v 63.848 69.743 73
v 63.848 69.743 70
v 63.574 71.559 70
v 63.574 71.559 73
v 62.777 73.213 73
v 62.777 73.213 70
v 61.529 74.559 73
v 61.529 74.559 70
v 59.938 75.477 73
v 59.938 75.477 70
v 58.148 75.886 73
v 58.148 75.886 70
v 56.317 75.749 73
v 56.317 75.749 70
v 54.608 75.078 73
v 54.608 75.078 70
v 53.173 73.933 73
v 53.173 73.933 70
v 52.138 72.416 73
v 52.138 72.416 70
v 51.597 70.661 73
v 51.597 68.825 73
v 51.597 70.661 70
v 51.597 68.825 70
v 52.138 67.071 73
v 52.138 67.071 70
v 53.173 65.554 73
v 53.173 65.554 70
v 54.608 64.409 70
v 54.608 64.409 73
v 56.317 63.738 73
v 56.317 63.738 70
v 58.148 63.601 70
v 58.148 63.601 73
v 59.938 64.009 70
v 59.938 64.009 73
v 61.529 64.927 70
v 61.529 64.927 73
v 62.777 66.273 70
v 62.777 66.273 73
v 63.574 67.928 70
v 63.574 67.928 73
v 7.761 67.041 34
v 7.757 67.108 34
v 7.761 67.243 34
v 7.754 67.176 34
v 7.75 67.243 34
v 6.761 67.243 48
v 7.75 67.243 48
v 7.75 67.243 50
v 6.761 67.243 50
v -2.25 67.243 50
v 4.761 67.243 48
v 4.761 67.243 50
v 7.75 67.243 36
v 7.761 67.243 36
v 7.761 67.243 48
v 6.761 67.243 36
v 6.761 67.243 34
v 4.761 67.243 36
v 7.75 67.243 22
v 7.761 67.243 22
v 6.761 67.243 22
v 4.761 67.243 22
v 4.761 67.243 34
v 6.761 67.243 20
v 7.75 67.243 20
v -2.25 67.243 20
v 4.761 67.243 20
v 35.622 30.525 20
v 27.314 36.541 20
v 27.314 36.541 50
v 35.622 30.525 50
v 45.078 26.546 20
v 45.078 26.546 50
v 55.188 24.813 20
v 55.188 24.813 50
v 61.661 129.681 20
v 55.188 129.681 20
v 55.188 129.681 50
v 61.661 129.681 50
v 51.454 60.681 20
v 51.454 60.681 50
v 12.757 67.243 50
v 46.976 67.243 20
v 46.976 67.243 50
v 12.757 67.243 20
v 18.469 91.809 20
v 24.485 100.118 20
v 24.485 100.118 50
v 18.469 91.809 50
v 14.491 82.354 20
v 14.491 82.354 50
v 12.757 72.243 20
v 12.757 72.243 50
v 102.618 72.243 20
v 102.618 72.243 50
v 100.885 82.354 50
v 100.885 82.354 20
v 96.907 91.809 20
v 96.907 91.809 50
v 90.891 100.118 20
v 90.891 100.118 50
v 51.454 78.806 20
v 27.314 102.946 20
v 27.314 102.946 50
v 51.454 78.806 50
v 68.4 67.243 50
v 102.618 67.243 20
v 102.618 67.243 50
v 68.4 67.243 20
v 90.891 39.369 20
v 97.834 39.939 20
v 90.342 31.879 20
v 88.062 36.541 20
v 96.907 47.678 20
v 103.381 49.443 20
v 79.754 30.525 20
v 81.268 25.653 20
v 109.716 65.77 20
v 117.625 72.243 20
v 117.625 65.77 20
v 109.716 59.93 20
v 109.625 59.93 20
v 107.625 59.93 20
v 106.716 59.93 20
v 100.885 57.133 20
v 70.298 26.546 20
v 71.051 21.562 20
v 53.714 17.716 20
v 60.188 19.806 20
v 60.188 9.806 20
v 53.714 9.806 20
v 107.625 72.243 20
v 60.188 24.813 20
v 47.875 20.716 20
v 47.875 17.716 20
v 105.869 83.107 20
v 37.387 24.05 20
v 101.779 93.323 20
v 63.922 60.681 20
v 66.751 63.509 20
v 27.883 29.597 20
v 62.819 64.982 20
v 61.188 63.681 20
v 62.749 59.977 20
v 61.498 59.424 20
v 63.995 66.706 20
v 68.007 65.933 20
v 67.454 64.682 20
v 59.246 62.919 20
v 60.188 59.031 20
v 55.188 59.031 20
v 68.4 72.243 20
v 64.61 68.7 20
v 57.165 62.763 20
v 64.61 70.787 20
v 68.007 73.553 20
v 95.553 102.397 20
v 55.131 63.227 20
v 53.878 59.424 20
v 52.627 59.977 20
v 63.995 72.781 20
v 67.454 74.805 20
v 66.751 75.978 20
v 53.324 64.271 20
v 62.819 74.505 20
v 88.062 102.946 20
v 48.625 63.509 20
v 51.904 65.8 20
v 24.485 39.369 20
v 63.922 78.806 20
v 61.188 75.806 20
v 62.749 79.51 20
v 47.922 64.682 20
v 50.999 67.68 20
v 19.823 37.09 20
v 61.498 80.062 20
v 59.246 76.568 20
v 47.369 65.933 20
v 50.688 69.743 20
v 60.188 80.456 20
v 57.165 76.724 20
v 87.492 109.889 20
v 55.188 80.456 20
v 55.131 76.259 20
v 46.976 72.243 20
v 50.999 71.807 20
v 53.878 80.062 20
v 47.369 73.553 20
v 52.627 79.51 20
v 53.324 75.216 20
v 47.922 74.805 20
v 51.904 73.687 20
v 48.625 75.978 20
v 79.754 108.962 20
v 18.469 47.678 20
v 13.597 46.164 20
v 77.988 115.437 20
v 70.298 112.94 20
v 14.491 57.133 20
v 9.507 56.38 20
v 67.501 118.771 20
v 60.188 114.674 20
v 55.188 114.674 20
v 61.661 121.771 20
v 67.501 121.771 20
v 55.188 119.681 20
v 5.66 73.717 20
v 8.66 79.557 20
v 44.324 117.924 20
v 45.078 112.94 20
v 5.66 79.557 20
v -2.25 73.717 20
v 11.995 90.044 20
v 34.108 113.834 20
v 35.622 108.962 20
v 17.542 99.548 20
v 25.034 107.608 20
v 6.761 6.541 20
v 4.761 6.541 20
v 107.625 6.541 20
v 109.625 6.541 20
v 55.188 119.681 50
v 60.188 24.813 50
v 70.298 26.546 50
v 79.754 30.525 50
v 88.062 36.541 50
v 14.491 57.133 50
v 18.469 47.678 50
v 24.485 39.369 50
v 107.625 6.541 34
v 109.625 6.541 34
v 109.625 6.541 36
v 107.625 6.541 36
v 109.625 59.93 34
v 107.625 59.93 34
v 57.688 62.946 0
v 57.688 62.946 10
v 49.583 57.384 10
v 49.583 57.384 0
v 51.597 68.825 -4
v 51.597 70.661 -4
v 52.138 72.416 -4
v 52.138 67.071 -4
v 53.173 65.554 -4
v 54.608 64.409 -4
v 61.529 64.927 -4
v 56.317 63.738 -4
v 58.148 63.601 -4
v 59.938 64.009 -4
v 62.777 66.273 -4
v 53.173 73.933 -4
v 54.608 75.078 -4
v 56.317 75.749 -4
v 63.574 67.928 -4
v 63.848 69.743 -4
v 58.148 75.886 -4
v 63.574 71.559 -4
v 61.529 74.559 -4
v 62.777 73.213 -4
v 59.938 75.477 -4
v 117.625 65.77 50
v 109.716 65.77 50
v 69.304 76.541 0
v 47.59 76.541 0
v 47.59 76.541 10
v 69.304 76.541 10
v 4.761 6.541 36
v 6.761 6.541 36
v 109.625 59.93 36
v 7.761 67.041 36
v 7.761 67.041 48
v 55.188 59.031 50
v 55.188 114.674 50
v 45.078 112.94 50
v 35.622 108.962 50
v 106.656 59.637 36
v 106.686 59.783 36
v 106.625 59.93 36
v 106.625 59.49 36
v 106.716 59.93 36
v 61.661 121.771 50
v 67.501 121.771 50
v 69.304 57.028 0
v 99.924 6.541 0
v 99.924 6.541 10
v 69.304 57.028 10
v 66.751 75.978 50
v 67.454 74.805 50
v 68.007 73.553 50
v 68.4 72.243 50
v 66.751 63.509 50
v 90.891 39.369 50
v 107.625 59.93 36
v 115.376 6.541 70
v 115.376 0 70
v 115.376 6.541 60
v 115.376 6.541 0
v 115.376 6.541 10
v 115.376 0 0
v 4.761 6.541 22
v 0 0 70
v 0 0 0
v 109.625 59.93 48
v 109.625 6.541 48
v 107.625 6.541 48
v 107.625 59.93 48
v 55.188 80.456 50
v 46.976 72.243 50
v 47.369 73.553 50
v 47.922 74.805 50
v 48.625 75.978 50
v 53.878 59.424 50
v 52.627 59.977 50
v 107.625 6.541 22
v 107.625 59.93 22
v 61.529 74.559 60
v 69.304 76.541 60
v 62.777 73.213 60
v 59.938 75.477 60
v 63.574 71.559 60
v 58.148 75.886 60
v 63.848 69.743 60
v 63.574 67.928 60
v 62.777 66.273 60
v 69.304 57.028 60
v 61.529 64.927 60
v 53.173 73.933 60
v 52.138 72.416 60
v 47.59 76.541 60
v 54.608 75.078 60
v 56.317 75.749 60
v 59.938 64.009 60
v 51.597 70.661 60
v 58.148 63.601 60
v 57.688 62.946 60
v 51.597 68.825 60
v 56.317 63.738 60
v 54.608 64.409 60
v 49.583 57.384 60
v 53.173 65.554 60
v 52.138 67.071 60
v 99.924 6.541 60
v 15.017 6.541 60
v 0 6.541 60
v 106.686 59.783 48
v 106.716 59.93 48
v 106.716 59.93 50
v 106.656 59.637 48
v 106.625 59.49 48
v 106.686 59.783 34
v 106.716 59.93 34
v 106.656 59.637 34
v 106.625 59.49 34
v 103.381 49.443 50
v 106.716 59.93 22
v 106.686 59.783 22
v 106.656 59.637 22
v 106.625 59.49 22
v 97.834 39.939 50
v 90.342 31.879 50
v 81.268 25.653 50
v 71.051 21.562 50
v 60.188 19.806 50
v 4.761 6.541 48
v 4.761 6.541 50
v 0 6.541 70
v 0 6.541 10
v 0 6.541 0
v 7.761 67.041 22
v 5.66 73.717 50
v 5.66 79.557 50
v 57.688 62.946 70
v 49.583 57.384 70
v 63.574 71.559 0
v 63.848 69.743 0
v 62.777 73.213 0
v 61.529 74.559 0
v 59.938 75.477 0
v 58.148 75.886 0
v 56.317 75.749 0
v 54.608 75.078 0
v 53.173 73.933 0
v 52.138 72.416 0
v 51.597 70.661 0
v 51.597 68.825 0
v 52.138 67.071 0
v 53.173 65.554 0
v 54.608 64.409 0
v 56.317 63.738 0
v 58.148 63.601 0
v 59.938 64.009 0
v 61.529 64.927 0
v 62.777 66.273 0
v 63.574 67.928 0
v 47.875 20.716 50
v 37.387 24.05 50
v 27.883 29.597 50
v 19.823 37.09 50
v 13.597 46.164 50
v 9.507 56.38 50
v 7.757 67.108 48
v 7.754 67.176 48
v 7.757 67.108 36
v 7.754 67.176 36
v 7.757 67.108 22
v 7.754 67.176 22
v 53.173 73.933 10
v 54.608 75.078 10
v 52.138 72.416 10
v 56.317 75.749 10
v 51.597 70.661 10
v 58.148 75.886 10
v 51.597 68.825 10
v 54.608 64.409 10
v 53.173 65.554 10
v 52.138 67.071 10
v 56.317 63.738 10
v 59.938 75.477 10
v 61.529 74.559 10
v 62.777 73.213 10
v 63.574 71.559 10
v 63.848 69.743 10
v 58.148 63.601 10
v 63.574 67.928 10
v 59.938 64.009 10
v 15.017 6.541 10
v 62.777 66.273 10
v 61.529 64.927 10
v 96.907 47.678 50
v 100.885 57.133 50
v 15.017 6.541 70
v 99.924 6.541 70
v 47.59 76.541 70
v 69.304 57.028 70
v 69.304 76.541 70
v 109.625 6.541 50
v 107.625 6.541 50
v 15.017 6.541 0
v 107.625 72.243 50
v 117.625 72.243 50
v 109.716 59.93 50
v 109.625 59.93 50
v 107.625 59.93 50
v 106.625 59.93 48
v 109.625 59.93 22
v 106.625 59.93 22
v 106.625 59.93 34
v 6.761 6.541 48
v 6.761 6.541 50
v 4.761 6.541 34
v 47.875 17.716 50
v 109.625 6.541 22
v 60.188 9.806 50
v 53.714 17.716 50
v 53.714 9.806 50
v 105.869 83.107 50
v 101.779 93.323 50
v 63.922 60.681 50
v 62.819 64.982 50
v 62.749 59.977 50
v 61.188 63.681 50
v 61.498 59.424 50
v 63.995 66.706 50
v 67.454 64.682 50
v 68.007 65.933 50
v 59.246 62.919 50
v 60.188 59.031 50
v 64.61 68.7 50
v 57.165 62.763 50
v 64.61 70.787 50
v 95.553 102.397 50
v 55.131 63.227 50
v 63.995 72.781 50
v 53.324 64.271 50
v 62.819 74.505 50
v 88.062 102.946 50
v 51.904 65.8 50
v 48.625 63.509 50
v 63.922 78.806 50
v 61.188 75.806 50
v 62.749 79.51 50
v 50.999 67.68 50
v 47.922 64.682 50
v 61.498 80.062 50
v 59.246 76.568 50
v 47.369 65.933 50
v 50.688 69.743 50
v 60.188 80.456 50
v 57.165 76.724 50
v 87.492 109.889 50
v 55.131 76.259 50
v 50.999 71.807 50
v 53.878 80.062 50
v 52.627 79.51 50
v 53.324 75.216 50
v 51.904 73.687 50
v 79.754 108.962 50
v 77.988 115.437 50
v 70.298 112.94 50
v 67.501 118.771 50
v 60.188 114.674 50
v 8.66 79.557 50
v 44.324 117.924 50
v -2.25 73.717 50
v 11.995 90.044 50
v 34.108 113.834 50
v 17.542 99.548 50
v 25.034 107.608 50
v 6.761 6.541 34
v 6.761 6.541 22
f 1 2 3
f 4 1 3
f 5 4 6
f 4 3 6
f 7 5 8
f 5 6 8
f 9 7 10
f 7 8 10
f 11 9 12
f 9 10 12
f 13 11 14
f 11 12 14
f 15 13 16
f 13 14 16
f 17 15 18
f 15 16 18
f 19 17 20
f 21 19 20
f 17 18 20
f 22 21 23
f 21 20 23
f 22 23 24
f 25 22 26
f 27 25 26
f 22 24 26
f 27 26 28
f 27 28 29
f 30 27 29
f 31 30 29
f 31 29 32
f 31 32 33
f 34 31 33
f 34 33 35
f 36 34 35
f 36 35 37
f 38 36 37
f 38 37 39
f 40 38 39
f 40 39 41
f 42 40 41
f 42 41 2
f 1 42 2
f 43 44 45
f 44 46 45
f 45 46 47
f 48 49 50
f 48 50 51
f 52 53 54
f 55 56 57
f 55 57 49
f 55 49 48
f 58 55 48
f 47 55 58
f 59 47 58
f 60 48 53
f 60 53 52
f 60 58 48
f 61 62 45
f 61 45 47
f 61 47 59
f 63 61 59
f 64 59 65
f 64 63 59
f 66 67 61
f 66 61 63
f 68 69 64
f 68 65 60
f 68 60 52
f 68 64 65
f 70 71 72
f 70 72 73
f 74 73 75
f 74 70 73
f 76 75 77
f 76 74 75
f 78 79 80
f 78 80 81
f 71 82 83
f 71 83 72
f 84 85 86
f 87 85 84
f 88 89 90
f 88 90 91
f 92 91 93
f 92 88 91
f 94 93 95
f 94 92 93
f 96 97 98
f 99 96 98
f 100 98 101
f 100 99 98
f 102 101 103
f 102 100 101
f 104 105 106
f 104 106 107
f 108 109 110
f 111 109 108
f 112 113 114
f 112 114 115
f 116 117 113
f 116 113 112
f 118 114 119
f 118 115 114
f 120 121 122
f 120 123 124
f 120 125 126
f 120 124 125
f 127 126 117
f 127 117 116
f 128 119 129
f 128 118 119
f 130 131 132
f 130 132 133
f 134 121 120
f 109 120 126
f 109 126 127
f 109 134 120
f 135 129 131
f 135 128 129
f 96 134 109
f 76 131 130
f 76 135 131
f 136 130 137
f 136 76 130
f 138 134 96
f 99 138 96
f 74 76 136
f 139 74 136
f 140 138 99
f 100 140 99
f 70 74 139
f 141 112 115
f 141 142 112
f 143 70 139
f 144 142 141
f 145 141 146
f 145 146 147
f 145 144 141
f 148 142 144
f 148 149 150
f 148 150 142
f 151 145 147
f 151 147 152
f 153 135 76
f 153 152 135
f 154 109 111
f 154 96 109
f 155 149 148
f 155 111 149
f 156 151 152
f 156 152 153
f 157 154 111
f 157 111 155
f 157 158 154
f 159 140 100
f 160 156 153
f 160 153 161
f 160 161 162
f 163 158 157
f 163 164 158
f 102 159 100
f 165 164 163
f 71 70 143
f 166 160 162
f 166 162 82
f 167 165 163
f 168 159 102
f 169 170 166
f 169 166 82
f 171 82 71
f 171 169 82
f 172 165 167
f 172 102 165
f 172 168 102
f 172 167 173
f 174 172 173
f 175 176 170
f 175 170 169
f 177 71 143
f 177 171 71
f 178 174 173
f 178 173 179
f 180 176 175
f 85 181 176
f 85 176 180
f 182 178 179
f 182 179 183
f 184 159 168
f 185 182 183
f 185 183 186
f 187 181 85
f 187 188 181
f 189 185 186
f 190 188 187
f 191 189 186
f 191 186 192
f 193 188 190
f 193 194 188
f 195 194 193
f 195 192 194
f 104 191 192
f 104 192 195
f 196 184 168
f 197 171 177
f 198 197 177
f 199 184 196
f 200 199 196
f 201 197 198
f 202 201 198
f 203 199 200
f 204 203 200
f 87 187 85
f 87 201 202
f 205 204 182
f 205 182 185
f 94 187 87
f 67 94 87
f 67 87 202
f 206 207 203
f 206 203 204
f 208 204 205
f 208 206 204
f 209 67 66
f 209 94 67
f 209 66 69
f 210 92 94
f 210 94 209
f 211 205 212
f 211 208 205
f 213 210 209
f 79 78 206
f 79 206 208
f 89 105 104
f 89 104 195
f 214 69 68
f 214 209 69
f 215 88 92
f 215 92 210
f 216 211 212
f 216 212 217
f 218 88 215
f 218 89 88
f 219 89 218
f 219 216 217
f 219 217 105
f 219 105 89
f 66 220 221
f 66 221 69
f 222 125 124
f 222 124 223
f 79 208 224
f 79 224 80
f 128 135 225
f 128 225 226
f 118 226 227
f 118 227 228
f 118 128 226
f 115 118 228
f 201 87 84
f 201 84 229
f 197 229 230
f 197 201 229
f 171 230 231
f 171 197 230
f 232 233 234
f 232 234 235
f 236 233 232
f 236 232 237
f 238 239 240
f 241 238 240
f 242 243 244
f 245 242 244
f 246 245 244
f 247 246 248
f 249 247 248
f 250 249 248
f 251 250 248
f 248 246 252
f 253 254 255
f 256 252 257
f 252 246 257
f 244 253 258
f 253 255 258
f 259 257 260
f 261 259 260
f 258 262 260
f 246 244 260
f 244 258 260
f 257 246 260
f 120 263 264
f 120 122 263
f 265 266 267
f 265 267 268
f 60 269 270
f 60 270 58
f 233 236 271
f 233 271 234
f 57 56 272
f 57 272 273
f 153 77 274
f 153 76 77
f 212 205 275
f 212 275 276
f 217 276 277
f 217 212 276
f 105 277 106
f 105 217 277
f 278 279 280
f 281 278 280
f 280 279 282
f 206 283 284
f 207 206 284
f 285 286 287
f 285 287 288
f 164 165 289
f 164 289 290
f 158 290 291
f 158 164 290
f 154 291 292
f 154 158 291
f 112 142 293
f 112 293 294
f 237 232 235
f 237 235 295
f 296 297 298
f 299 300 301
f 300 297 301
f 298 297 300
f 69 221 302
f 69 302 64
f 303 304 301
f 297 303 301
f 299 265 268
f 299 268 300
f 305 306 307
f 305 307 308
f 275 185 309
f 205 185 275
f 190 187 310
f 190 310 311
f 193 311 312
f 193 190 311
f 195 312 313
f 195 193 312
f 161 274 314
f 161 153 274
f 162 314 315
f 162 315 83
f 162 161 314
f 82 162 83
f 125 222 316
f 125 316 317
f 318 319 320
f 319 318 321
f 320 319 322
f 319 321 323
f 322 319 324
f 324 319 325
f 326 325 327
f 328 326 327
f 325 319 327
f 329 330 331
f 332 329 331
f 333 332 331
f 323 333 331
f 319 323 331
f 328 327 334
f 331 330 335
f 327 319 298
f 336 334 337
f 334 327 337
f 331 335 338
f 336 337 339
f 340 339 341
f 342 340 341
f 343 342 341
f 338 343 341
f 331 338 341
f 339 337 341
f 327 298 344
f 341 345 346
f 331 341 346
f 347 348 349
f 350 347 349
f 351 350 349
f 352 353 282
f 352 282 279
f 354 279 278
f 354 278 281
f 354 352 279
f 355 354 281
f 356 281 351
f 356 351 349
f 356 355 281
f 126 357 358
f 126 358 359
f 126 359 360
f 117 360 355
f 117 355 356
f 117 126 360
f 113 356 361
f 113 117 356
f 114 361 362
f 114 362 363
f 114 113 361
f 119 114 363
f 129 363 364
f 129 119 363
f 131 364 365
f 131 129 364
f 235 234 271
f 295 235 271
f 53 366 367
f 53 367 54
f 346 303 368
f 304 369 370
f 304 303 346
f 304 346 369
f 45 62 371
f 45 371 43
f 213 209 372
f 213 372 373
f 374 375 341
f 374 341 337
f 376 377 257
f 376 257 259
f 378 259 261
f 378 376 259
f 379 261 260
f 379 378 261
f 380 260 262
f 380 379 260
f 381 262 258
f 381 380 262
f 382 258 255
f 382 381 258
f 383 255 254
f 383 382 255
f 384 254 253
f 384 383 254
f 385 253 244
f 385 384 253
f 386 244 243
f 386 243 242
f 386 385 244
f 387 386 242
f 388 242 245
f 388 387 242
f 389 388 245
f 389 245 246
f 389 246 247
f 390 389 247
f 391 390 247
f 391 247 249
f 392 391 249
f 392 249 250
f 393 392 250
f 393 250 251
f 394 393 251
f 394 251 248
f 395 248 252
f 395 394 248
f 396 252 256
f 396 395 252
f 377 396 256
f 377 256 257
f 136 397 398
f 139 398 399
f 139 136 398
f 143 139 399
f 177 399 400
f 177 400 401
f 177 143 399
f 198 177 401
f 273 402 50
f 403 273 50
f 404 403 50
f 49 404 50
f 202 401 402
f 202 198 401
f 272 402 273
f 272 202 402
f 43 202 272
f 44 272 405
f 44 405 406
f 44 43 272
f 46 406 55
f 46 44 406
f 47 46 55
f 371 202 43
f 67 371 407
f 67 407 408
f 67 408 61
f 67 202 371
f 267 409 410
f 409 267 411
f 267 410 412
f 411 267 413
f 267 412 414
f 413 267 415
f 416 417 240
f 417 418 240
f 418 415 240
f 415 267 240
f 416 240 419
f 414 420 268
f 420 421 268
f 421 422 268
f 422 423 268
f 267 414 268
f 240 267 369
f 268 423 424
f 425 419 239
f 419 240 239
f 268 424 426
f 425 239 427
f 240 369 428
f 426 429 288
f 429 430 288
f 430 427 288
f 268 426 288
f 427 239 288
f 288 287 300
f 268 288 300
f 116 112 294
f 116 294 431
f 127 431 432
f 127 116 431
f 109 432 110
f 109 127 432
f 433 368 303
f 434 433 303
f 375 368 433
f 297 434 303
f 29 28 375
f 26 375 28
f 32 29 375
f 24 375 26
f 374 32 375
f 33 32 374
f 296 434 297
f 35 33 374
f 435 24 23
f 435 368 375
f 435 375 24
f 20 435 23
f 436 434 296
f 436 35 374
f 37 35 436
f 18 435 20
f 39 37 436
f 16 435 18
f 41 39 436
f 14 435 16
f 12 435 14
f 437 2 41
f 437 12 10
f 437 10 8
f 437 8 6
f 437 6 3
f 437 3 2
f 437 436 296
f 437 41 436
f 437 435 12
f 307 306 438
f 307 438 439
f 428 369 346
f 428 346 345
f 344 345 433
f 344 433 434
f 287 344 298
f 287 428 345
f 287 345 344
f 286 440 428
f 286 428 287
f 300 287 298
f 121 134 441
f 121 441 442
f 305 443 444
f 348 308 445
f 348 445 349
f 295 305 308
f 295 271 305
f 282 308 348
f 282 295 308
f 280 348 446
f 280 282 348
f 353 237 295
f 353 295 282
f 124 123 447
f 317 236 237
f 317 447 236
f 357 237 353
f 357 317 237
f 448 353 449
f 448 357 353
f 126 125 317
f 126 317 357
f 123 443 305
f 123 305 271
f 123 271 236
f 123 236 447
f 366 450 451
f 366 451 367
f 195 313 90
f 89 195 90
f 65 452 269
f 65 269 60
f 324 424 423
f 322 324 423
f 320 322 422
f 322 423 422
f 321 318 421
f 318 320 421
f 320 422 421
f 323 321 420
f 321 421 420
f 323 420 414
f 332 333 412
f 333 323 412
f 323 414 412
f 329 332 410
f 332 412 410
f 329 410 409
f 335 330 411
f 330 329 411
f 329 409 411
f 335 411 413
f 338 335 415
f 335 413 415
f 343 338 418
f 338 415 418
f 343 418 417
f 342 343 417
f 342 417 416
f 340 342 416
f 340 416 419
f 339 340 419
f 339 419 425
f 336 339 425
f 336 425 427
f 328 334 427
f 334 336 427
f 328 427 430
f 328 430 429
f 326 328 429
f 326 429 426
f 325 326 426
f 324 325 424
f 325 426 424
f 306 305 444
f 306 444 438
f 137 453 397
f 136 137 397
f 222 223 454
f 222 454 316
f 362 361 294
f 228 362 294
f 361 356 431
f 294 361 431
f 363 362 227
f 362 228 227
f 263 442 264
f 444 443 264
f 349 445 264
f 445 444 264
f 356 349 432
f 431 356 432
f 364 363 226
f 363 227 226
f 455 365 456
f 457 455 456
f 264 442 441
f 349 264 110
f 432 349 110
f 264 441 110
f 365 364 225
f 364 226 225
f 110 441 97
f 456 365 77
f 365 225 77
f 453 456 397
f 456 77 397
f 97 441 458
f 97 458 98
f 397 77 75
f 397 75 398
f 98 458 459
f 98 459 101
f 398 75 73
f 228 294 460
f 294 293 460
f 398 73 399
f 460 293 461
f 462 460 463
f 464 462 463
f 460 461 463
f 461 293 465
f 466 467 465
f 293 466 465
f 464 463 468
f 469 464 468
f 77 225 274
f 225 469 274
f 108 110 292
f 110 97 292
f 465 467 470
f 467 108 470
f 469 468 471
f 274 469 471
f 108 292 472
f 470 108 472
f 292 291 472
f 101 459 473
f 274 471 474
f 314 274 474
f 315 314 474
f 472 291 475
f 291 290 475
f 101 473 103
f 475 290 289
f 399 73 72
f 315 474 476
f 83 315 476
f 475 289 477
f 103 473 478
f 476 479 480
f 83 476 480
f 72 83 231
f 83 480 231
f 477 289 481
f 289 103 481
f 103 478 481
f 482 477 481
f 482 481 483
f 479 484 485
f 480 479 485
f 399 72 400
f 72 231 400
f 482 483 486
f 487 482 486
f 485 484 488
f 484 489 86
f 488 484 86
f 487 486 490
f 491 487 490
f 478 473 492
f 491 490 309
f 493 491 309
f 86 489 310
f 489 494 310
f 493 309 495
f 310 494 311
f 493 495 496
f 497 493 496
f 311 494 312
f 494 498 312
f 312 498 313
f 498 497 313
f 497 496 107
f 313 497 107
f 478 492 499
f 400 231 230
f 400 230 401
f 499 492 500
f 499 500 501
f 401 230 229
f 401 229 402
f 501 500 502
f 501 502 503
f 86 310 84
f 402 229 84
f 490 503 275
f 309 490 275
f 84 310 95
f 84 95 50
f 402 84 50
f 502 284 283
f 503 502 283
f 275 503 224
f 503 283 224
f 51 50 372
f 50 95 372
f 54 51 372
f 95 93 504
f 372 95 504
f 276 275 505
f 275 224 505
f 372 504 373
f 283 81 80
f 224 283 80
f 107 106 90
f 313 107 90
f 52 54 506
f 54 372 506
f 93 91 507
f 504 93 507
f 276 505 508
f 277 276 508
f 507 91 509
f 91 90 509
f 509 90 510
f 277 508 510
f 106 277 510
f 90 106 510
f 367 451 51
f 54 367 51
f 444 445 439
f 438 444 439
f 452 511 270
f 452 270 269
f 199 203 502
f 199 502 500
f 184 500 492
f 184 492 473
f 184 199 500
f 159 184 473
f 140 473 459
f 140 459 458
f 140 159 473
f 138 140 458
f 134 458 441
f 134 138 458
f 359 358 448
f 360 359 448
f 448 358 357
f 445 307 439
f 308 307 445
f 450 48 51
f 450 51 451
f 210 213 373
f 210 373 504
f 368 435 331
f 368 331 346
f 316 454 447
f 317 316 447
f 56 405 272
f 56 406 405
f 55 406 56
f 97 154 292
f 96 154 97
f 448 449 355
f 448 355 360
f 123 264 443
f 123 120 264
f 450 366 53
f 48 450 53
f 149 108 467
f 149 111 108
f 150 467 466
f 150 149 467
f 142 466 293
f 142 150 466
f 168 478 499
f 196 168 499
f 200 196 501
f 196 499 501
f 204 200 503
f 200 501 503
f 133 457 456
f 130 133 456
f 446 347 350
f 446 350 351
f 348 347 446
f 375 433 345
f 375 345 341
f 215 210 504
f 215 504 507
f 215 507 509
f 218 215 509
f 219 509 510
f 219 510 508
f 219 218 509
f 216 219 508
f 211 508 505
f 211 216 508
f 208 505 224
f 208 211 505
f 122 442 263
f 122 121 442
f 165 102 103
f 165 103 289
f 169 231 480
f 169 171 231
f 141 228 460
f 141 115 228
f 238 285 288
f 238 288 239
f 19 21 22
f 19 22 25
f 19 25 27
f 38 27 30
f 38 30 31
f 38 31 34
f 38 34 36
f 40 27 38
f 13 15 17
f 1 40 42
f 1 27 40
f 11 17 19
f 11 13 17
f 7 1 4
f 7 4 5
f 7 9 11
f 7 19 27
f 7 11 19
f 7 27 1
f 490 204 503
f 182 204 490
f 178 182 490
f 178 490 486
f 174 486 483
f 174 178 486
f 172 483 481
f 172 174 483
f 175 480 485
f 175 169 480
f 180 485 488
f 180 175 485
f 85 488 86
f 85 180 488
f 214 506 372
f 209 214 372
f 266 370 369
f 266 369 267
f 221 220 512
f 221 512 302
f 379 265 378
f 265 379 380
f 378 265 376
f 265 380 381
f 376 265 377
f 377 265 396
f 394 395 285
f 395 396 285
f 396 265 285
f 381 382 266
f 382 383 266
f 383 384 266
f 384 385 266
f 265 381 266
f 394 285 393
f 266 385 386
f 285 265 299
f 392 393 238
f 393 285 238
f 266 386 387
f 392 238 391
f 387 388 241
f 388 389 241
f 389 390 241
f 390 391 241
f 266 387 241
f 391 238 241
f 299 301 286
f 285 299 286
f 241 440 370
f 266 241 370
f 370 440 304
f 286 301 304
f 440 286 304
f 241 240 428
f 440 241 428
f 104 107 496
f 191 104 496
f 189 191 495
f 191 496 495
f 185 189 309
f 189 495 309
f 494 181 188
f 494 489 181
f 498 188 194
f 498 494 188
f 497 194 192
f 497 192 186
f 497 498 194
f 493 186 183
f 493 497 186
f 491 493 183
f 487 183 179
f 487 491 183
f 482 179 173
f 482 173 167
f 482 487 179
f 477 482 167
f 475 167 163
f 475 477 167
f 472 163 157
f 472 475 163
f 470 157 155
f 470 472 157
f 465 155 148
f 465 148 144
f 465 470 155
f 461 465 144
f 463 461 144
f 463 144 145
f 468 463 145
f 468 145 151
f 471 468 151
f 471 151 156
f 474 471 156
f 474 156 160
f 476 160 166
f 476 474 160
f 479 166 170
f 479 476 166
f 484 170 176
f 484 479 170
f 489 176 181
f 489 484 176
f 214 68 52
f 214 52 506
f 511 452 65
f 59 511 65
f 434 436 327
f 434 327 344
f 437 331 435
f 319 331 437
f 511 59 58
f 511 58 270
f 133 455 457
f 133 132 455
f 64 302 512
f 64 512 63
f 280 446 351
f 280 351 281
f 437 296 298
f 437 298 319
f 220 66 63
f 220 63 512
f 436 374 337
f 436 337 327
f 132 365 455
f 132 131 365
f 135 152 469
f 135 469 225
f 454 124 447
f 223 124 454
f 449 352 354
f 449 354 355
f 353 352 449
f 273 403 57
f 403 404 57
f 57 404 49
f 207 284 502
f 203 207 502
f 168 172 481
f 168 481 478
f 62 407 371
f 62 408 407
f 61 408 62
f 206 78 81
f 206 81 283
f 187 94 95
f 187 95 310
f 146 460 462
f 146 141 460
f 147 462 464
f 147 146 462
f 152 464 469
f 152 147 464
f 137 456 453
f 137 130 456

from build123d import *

# Parameters (mm, degrees)
CROQUIS1_W                   = 115.375917884
CROQUIS1_H                   = 6.540670241
SALIENTE_EXTRUIR1_DEPTH      = 70
CROQUIS4_W                   = 57.687958942
CROQUIS4_H                   = 10
SALIENTE_EXTRUIR2_DEPTH      = 70
CORTAR_EXTRUIR2_DEPTH        = 35
CORTAR_EXTRUIR3_DEPTH        = 35
CROQUIS7_R                   = 6.05660598
CORTAR_EXTRUIR4_DEPTH        = 35
CROQUIS10_R                  = 6.159768466
SALIENTE_EXTRUIR3_DEPTH      = 73
SALIENTE_EXTRUIR3_DEPTH_BACK = 4
CROQUIS25_R                  = 7
SALIENTE_EXTRUIR12_DEPTH     = 15
CROQUIS29_W                  = 12
CROQUIS29_H                  = 53.389522775
CORTAR_EXTRUIR6_DEPTH        = 3
CROQUIS33_W                  = 12
CROQUIS33_H                  = 60.702688994
CORTAR_EXTRUIR8_DEPTH        = 3


with BuildPart() as part:
    # Croquis1 → Saliente-Extruir1 (new body)
    with BuildSketch(Plane.XY):
        with Locations((57.687958942, 3.270335121)):
            Rectangle(CROQUIS1_W, CROQUIS1_H)
    extrude(amount=SALIENTE_EXTRUIR1_DEPTH)

    # Croquis4 → Saliente-Extruir2 (add)
    with BuildSketch(Plane(origin=(0, 6.540670241, 0), x_dir=(1, 0, 0), z_dir=(0, 1, 0))):
        with Locations((28.843979471, -5)):
            Rectangle(CROQUIS4_W, CROQUIS4_H)
        with Locations((86.531938413, -5)):
            Rectangle(CROQUIS4_W, CROQUIS4_H)
        with Locations((28.843979471, -65)):
            Rectangle(CROQUIS4_W, CROQUIS4_H)
        with Locations((86.531938413, -65)):
            Rectangle(CROQUIS4_W, CROQUIS4_H)
    extrude(amount=SALIENTE_EXTRUIR2_DEPTH)

    # Croquis5 → Cortar-Extruir2 (cut, symmetric)
    with BuildSketch(Plane.XY.offset(10)):
        Polygon((0, 6.540670241), (47.590279049, 76.540670241), (0, 76.540670241), align=None)
        Polygon((57.687958942, 6.540670241), (57.687958942, 62.946048228), (49.583363908, 57.38419593), (15.016827117, 6.540670241), align=None)
    extrude(amount=CORTAR_EXTRUIR2_DEPTH, both=True, mode=Mode.SUBTRACT)

    # Croquis6 → Cortar-Extruir3 (cut, symmetric)
    with BuildSketch(Plane.XY.offset(10)):
        Polygon((69.303593334, 57.028333792), (57.687958942, 62.946048228), (57.687958942, 6.540670241), (99.924183433, 6.540670241), align=None)
        Polygon((69.303593334, 76.540670241), (115.375917884, 6.540670241), (115.375917884, 76.540670241), align=None)
        with BuildLine():
            ThreePointArc((57.687958942, 75.799965215), (51.631352961, 69.743359235), (57.687958942, 63.686753254))
            Line((57.687958942, 63.686753254), (57.687958942, 75.799965215))
        make_face()
        with BuildLine():
            Line((57.687958942, 75.799965215), (57.687958942, 63.686753254))
            ThreePointArc((57.687958942, 63.686753254), (61.970626102, 65.460692075), (63.744564922, 69.743359235))
            ThreePointArc((63.744564922, 69.743359235), (61.970626102, 74.026026395), (57.687958942, 75.799965215))
        make_face()
    extrude(amount=CORTAR_EXTRUIR3_DEPTH, both=True, mode=Mode.SUBTRACT)

    # Croquis7 → Cortar-Extruir4 (cut, symmetric)
    with BuildSketch(Plane(origin=(0, 0, 60), x_dir=(-1, 0, 0), z_dir=(0, 0, -1))):
        Polygon((0, 76.540670241), (-47.590279049, 76.540670241), (0, 6.540670241), align=None)
        Polygon((-69.303593334, 57.028333792), (-99.924183433, 6.540670241), (-15.016827117, 6.540670241), (-49.583363908, 57.38419593), (-57.687958942, 62.946048228), align=None)
        Polygon((-115.375917884, 76.540670241), (-115.375917884, 6.540670241), (-69.303593334, 76.540670241), align=None)
        with Locations((-57.687958942, 69.743359235)):
            Circle(CROQUIS7_R)
    extrude(amount=CORTAR_EXTRUIR4_DEPTH, both=True, mode=Mode.SUBTRACT)

    # Croquis10 → Saliente-Extruir3 (add, two sides)
    with BuildSketch(Plane.XY) as saliente_extruir3_sk:
        with Locations((57.687958942, 69.743359235)):
            Circle(CROQUIS10_R)
    extrude(amount=SALIENTE_EXTRUIR3_DEPTH)
    extrude(saliente_extruir3_sk.sketch, amount=-SALIENTE_EXTRUIR3_DEPTH_BACK)


with BuildPart() as body_2:
    # Croquis25 → Saliente-Extruir12 (new body, symmetric)
    with BuildSketch(Plane(origin=(0, 0, 35), x_dir=(-1, 0, 0), z_dir=(0, 0, -1))):
        with BuildLine():
            Line((-7.750498053, 67.243359235), (-6.761041311, 67.243359235))
            Line((-6.761041311, 67.243359235), (-6.761041311, 6.540670241))
            Line((-6.761041311, 6.540670241), (-4.761041311, 6.540670241))
            Line((-4.761041311, 6.540670241), (-4.761041311, 67.243359235))
            Line((-4.761041311, 67.243359235), (2.249501947, 67.243359235))
            Line((2.249501947, 67.243359235), (2.249501947, 73.716885116))
            Line((2.249501947, 73.716885116), (-5.660397624, 73.716885116))
            Line((-5.660397624, 73.716885116), (-5.660397624, 79.556525453))
            Line((-5.660397624, 79.556525453), (-8.660397624, 79.556525453))
            ThreePointArc((-8.660397624, 79.556525453), (-25.034289171, 107.608090192), (-55.187958942, 119.680820123))
            Line((-55.187958942, 119.680820123), (-55.187958942, 129.680820123))
            Line((-55.187958942, 129.680820123), (-61.661484823, 129.680820123))
            Line((-61.661484823, 129.680820123), (-61.661484823, 121.770920553))
            Line((-61.661484823, 121.770920553), (-67.50112516, 121.770920553))
            Line((-67.50112516, 121.770920553), (-67.50112516, 118.770920553))
            ThreePointArc((-67.50112516, 118.770920553), (-95.552689899, 102.397029006), (-107.62541983, 72.243359235))
            Line((-107.62541983, 72.243359235), (-117.62541983, 72.243359235))
            Line((-117.62541983, 72.243359235), (-117.62541983, 65.769833354))
            Line((-117.62541983, 65.769833354), (-109.71552026, 65.769833354))
            Line((-109.71552026, 65.769833354), (-109.71552026, 59.930193016))
            Line((-109.71552026, 59.930193016), (-109.62541983, 59.930193016))
            Line((-109.62541983, 59.930193016), (-109.62541983, 6.540670241))
            Line((-109.62541983, 6.540670241), (-107.62541983, 6.540670241))
            Line((-107.62541983, 6.540670241), (-107.62541983, 59.930193016))
            Line((-107.62541983, 59.930193016), (-106.71552026, 59.930193016))
            ThreePointArc((-106.71552026, 59.930193016), (-90.341628713, 31.878628277), (-60.187958942, 19.805898346))
            Line((-60.187958942, 19.805898346), (-60.187958942, 9.805898346))
            Line((-60.187958942, 9.805898346), (-53.714433061, 9.805898346))
            Line((-53.714433061, 9.805898346), (-53.714433061, 17.715797917))
            Line((-53.714433061, 17.715797917), (-47.874792723, 17.715797917))
            Line((-47.874792723, 17.715797917), (-47.874792723, 20.715797917))
            ThreePointArc((-47.874792723, 20.715797917), (-19.823227985, 37.089689464), (-7.750498053, 67.243359235))
        make_face()
        with BuildLine():
            Line((-60.187958942, 59.031216592), (-60.187958942, 24.812857346))
            ThreePointArc((-60.187958942, 24.812857346), (-75.139706125, 28.265214143), (-88.06210803, 36.540783022))
            Line((-88.06210803, 36.540783022), (-63.92227465, 60.680616402))
            ThreePointArc((-63.92227465, 60.680616402), (-62.132303399, 59.681162539), (-60.187958942, 59.031216592))
        make_face(mode=Mode.SUBTRACT)
        with BuildLine():
            Line((-66.750701775, 63.509043527), (-90.890535155, 39.369210147))
            ThreePointArc((-90.890535155, 39.369210147), (-99.166104034, 52.291612052), (-102.618460831, 67.243359235))
            Line((-102.618460831, 67.243359235), (-68.400101585, 67.243359235))
            ThreePointArc((-68.400101585, 67.243359235), (-67.750155638, 65.299014777), (-66.750701775, 63.509043527))
        make_face(mode=Mode.SUBTRACT)
        with BuildLine():
            Line((-51.453643234, 60.680616402), (-27.313809854, 36.540783022))
            ThreePointArc((-27.313809854, 36.540783022), (-40.236211759, 28.265214143), (-55.187958942, 24.812857346))
            Line((-55.187958942, 24.812857346), (-55.187958942, 59.031216592))
            ThreePointArc((-55.187958942, 59.031216592), (-53.243614485, 59.681162539), (-51.453643234, 60.680616402))
        make_face(mode=Mode.SUBTRACT)
        with Locations((-57.687958942, 69.743359235)):
            Circle(CROQUIS25_R, mode=Mode.SUBTRACT)
        with BuildLine():
            Line((-46.975816299, 67.243359235), (-12.757457053, 67.243359235))
            ThreePointArc((-12.757457053, 67.243359235), (-16.20981385, 52.291612052), (-24.485382729, 39.369210147))
            Line((-24.485382729, 39.369210147), (-48.625216109, 63.509043527))
            ThreePointArc((-48.625216109, 63.509043527), (-47.625762246, 65.299014777), (-46.975816299, 67.243359235))
        make_face(mode=Mode.SUBTRACT)
        with BuildLine():
            Line((-90.890535155, 100.117508323), (-66.750701775, 75.977674943))
            ThreePointArc((-66.750701775, 75.977674943), (-67.750155638, 74.187703692), (-68.400101585, 72.243359235))
            Line((-68.400101585, 72.243359235), (-102.618460831, 72.243359235))
            ThreePointArc((-102.618460831, 72.243359235), (-99.166104034, 87.195106418), (-90.890535155, 100.117508323))
        make_face(mode=Mode.SUBTRACT)
        with BuildLine():
            Line((-63.92227465, 78.806102068), (-88.06210803, 102.945935448))
            ThreePointArc((-88.06210803, 102.945935448), (-75.139706125, 111.221504327), (-60.187958942, 114.673861124))
            Line((-60.187958942, 114.673861124), (-60.187958942, 80.455501878))
            ThreePointArc((-60.187958942, 80.455501878), (-62.132303399, 79.805555931), (-63.92227465, 78.806102068))
        make_face(mode=Mode.SUBTRACT)
        with BuildLine():
            Line((-27.313809854, 102.945935448), (-51.453643234, 78.806102068))
            ThreePointArc((-51.453643234, 78.806102068), (-53.243614485, 79.805555931), (-55.187958942, 80.455501878))
            Line((-55.187958942, 80.455501878), (-55.187958942, 114.673861124))
            ThreePointArc((-55.187958942, 114.673861124), (-40.236211759, 111.221504327), (-27.313809854, 102.945935448))
        make_face(mode=Mode.SUBTRACT)
        with BuildLine():
            Line((-48.625216109, 75.977674943), (-24.485382729, 100.117508323))
            ThreePointArc((-24.485382729, 100.117508323), (-16.20981385, 87.195106418), (-12.757457053, 72.243359235))
            Line((-12.757457053, 72.243359235), (-46.975816299, 72.243359235))
            ThreePointArc((-46.975816299, 72.243359235), (-47.625762246, 74.187703692), (-48.625216109, 75.977674943))
        make_face(mode=Mode.SUBTRACT)
    extrude(amount=SALIENTE_EXTRUIR12_DEPTH, both=True)

    # Croquis29 → Cortar-Extruir6 (cut)
    with BuildSketch(Plane(origin=(109.62541983, 0, 0), x_dir=(0, 0, -1), z_dir=(1, 0, 0))):
        with Locations((-42, 33.235431629)):
            Rectangle(CROQUIS29_W, CROQUIS29_H)
        with Locations((-28, 33.235431629)):
            Rectangle(CROQUIS29_W, CROQUIS29_H)
    extrude(amount=-CORTAR_EXTRUIR6_DEPTH, mode=Mode.SUBTRACT)

    # Croquis33 → Cortar-Extruir8 (cut)
    with BuildSketch(Plane.ZY.offset(-4.761041311)):
        with Locations((28, 36.892014738)):
            Rectangle(CROQUIS33_W, CROQUIS33_H)
        with Locations((42, 36.892014738)):
            Rectangle(CROQUIS33_W, CROQUIS33_H)
    extrude(amount=-CORTAR_EXTRUIR8_DEPTH, mode=Mode.SUBTRACT)


solid = Compound([part.part, body_2.part])
